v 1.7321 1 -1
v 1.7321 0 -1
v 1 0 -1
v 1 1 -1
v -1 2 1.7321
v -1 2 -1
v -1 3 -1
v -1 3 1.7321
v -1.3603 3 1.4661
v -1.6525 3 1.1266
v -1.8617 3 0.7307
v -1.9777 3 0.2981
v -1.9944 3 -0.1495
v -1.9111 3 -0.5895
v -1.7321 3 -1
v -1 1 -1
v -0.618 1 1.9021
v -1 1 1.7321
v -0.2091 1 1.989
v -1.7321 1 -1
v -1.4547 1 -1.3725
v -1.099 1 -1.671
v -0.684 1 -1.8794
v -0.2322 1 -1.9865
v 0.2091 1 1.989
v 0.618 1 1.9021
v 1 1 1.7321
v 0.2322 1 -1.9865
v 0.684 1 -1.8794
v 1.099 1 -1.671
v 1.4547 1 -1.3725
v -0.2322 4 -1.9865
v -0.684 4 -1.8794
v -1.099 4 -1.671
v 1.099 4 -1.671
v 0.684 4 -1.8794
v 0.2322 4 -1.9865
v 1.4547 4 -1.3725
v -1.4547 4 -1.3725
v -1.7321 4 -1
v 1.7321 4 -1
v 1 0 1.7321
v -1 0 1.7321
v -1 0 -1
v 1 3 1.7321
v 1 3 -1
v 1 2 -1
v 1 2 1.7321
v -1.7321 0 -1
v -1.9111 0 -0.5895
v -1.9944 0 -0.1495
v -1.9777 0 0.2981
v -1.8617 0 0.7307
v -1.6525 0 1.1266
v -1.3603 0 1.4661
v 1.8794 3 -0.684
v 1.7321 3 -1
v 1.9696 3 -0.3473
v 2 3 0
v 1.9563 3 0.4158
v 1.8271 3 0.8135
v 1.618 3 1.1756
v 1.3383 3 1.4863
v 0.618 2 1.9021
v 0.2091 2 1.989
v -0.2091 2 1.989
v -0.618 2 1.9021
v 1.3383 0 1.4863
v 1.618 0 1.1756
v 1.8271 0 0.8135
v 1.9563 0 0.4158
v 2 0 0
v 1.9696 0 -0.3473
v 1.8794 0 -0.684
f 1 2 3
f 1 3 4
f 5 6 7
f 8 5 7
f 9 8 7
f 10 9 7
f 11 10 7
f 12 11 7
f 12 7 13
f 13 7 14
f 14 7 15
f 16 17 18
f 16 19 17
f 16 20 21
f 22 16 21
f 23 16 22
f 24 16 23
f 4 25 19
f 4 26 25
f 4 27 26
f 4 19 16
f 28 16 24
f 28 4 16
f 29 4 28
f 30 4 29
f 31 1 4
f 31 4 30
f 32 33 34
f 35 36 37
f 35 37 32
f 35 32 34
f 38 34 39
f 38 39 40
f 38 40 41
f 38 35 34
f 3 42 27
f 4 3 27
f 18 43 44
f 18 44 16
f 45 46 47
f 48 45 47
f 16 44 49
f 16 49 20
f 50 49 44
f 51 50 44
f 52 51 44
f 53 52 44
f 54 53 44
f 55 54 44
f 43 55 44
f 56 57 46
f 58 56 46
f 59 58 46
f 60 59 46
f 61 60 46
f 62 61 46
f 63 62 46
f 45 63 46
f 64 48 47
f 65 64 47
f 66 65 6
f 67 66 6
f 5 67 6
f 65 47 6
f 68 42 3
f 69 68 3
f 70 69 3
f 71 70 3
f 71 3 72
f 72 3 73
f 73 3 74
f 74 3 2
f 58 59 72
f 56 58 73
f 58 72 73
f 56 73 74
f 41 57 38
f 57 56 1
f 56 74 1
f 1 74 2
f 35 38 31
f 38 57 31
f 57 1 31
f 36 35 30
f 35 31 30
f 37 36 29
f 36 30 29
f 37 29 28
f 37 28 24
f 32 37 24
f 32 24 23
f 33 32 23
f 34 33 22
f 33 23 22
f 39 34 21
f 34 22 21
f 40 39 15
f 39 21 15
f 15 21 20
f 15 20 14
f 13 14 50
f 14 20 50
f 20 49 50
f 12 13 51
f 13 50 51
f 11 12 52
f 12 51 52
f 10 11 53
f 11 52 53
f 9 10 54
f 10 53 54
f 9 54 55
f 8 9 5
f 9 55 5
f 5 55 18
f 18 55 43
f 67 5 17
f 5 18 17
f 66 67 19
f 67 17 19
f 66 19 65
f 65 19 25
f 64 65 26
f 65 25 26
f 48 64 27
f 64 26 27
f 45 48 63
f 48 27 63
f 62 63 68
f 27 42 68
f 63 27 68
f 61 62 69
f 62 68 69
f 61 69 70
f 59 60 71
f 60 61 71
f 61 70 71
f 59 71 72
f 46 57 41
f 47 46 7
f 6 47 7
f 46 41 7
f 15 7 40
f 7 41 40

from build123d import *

# Parameters (mm, degrees)
SKETCH1_R               = 2
BOSS_EXTRUDE1_DEPTH     = 4
SKETCH2_W               = 2
SKETCH2_H               = 1
CUT_EXTRUDE1_DEPTH      = 2
CUT_EXTRUDE2_DEPTH      = 4
CUT_EXTRUDE2_DEPTH_BACK = 1
SKETCH4_W               = 0.732050808
SKETCH4_H               = 1
CUT_EXTRUDE3_DEPTH      = 5


with BuildPart() as part:
    # Sketch1 → Boss-Extrude1 (new body)
    with BuildSketch(Plane(origin=(0, 0, 0), x_dir=(1, 0, 0), z_dir=(0, 1, 0))):
        Circle(SKETCH1_R)
    extrude(amount=BOSS_EXTRUDE1_DEPTH)

    # Sketch2 → Cut-Extrude1 (cut, symmetric)
    with BuildSketch(Plane.XY):
        with Locations((0, 0.5)):
            Rectangle(SKETCH2_W, SKETCH2_H)
    extrude(amount=CUT_EXTRUDE1_DEPTH, both=True, mode=Mode.SUBTRACT)

    # Sketch3 → Cut-Extrude2 (cut, two sides)
    with BuildSketch(Plane.XY) as cut_extrude2_sk:
        Polygon((-2, 4), (2, 4), (2, 3), (1, 3), (1, 2), (-1, 2), (-1, 3), (-2, 3), align=None)
    extrude(amount=CUT_EXTRUDE2_DEPTH, mode=Mode.SUBTRACT)
    extrude(cut_extrude2_sk.sketch, amount=-CUT_EXTRUDE2_DEPTH_BACK, mode=Mode.SUBTRACT)

    # Sketch4 → Cut-Extrude3 (cut, symmetric)
    with BuildSketch(Plane(origin=(0, 0, 0), x_dir=(0, 0, -1), z_dir=(1, 0, 0))):
        with Locations((1.366025404, 0.5)):
            Rectangle(SKETCH4_W, SKETCH4_H)
    extrude(amount=CUT_EXTRUDE3_DEPTH, both=True, mode=Mode.SUBTRACT)


solid = part.part
